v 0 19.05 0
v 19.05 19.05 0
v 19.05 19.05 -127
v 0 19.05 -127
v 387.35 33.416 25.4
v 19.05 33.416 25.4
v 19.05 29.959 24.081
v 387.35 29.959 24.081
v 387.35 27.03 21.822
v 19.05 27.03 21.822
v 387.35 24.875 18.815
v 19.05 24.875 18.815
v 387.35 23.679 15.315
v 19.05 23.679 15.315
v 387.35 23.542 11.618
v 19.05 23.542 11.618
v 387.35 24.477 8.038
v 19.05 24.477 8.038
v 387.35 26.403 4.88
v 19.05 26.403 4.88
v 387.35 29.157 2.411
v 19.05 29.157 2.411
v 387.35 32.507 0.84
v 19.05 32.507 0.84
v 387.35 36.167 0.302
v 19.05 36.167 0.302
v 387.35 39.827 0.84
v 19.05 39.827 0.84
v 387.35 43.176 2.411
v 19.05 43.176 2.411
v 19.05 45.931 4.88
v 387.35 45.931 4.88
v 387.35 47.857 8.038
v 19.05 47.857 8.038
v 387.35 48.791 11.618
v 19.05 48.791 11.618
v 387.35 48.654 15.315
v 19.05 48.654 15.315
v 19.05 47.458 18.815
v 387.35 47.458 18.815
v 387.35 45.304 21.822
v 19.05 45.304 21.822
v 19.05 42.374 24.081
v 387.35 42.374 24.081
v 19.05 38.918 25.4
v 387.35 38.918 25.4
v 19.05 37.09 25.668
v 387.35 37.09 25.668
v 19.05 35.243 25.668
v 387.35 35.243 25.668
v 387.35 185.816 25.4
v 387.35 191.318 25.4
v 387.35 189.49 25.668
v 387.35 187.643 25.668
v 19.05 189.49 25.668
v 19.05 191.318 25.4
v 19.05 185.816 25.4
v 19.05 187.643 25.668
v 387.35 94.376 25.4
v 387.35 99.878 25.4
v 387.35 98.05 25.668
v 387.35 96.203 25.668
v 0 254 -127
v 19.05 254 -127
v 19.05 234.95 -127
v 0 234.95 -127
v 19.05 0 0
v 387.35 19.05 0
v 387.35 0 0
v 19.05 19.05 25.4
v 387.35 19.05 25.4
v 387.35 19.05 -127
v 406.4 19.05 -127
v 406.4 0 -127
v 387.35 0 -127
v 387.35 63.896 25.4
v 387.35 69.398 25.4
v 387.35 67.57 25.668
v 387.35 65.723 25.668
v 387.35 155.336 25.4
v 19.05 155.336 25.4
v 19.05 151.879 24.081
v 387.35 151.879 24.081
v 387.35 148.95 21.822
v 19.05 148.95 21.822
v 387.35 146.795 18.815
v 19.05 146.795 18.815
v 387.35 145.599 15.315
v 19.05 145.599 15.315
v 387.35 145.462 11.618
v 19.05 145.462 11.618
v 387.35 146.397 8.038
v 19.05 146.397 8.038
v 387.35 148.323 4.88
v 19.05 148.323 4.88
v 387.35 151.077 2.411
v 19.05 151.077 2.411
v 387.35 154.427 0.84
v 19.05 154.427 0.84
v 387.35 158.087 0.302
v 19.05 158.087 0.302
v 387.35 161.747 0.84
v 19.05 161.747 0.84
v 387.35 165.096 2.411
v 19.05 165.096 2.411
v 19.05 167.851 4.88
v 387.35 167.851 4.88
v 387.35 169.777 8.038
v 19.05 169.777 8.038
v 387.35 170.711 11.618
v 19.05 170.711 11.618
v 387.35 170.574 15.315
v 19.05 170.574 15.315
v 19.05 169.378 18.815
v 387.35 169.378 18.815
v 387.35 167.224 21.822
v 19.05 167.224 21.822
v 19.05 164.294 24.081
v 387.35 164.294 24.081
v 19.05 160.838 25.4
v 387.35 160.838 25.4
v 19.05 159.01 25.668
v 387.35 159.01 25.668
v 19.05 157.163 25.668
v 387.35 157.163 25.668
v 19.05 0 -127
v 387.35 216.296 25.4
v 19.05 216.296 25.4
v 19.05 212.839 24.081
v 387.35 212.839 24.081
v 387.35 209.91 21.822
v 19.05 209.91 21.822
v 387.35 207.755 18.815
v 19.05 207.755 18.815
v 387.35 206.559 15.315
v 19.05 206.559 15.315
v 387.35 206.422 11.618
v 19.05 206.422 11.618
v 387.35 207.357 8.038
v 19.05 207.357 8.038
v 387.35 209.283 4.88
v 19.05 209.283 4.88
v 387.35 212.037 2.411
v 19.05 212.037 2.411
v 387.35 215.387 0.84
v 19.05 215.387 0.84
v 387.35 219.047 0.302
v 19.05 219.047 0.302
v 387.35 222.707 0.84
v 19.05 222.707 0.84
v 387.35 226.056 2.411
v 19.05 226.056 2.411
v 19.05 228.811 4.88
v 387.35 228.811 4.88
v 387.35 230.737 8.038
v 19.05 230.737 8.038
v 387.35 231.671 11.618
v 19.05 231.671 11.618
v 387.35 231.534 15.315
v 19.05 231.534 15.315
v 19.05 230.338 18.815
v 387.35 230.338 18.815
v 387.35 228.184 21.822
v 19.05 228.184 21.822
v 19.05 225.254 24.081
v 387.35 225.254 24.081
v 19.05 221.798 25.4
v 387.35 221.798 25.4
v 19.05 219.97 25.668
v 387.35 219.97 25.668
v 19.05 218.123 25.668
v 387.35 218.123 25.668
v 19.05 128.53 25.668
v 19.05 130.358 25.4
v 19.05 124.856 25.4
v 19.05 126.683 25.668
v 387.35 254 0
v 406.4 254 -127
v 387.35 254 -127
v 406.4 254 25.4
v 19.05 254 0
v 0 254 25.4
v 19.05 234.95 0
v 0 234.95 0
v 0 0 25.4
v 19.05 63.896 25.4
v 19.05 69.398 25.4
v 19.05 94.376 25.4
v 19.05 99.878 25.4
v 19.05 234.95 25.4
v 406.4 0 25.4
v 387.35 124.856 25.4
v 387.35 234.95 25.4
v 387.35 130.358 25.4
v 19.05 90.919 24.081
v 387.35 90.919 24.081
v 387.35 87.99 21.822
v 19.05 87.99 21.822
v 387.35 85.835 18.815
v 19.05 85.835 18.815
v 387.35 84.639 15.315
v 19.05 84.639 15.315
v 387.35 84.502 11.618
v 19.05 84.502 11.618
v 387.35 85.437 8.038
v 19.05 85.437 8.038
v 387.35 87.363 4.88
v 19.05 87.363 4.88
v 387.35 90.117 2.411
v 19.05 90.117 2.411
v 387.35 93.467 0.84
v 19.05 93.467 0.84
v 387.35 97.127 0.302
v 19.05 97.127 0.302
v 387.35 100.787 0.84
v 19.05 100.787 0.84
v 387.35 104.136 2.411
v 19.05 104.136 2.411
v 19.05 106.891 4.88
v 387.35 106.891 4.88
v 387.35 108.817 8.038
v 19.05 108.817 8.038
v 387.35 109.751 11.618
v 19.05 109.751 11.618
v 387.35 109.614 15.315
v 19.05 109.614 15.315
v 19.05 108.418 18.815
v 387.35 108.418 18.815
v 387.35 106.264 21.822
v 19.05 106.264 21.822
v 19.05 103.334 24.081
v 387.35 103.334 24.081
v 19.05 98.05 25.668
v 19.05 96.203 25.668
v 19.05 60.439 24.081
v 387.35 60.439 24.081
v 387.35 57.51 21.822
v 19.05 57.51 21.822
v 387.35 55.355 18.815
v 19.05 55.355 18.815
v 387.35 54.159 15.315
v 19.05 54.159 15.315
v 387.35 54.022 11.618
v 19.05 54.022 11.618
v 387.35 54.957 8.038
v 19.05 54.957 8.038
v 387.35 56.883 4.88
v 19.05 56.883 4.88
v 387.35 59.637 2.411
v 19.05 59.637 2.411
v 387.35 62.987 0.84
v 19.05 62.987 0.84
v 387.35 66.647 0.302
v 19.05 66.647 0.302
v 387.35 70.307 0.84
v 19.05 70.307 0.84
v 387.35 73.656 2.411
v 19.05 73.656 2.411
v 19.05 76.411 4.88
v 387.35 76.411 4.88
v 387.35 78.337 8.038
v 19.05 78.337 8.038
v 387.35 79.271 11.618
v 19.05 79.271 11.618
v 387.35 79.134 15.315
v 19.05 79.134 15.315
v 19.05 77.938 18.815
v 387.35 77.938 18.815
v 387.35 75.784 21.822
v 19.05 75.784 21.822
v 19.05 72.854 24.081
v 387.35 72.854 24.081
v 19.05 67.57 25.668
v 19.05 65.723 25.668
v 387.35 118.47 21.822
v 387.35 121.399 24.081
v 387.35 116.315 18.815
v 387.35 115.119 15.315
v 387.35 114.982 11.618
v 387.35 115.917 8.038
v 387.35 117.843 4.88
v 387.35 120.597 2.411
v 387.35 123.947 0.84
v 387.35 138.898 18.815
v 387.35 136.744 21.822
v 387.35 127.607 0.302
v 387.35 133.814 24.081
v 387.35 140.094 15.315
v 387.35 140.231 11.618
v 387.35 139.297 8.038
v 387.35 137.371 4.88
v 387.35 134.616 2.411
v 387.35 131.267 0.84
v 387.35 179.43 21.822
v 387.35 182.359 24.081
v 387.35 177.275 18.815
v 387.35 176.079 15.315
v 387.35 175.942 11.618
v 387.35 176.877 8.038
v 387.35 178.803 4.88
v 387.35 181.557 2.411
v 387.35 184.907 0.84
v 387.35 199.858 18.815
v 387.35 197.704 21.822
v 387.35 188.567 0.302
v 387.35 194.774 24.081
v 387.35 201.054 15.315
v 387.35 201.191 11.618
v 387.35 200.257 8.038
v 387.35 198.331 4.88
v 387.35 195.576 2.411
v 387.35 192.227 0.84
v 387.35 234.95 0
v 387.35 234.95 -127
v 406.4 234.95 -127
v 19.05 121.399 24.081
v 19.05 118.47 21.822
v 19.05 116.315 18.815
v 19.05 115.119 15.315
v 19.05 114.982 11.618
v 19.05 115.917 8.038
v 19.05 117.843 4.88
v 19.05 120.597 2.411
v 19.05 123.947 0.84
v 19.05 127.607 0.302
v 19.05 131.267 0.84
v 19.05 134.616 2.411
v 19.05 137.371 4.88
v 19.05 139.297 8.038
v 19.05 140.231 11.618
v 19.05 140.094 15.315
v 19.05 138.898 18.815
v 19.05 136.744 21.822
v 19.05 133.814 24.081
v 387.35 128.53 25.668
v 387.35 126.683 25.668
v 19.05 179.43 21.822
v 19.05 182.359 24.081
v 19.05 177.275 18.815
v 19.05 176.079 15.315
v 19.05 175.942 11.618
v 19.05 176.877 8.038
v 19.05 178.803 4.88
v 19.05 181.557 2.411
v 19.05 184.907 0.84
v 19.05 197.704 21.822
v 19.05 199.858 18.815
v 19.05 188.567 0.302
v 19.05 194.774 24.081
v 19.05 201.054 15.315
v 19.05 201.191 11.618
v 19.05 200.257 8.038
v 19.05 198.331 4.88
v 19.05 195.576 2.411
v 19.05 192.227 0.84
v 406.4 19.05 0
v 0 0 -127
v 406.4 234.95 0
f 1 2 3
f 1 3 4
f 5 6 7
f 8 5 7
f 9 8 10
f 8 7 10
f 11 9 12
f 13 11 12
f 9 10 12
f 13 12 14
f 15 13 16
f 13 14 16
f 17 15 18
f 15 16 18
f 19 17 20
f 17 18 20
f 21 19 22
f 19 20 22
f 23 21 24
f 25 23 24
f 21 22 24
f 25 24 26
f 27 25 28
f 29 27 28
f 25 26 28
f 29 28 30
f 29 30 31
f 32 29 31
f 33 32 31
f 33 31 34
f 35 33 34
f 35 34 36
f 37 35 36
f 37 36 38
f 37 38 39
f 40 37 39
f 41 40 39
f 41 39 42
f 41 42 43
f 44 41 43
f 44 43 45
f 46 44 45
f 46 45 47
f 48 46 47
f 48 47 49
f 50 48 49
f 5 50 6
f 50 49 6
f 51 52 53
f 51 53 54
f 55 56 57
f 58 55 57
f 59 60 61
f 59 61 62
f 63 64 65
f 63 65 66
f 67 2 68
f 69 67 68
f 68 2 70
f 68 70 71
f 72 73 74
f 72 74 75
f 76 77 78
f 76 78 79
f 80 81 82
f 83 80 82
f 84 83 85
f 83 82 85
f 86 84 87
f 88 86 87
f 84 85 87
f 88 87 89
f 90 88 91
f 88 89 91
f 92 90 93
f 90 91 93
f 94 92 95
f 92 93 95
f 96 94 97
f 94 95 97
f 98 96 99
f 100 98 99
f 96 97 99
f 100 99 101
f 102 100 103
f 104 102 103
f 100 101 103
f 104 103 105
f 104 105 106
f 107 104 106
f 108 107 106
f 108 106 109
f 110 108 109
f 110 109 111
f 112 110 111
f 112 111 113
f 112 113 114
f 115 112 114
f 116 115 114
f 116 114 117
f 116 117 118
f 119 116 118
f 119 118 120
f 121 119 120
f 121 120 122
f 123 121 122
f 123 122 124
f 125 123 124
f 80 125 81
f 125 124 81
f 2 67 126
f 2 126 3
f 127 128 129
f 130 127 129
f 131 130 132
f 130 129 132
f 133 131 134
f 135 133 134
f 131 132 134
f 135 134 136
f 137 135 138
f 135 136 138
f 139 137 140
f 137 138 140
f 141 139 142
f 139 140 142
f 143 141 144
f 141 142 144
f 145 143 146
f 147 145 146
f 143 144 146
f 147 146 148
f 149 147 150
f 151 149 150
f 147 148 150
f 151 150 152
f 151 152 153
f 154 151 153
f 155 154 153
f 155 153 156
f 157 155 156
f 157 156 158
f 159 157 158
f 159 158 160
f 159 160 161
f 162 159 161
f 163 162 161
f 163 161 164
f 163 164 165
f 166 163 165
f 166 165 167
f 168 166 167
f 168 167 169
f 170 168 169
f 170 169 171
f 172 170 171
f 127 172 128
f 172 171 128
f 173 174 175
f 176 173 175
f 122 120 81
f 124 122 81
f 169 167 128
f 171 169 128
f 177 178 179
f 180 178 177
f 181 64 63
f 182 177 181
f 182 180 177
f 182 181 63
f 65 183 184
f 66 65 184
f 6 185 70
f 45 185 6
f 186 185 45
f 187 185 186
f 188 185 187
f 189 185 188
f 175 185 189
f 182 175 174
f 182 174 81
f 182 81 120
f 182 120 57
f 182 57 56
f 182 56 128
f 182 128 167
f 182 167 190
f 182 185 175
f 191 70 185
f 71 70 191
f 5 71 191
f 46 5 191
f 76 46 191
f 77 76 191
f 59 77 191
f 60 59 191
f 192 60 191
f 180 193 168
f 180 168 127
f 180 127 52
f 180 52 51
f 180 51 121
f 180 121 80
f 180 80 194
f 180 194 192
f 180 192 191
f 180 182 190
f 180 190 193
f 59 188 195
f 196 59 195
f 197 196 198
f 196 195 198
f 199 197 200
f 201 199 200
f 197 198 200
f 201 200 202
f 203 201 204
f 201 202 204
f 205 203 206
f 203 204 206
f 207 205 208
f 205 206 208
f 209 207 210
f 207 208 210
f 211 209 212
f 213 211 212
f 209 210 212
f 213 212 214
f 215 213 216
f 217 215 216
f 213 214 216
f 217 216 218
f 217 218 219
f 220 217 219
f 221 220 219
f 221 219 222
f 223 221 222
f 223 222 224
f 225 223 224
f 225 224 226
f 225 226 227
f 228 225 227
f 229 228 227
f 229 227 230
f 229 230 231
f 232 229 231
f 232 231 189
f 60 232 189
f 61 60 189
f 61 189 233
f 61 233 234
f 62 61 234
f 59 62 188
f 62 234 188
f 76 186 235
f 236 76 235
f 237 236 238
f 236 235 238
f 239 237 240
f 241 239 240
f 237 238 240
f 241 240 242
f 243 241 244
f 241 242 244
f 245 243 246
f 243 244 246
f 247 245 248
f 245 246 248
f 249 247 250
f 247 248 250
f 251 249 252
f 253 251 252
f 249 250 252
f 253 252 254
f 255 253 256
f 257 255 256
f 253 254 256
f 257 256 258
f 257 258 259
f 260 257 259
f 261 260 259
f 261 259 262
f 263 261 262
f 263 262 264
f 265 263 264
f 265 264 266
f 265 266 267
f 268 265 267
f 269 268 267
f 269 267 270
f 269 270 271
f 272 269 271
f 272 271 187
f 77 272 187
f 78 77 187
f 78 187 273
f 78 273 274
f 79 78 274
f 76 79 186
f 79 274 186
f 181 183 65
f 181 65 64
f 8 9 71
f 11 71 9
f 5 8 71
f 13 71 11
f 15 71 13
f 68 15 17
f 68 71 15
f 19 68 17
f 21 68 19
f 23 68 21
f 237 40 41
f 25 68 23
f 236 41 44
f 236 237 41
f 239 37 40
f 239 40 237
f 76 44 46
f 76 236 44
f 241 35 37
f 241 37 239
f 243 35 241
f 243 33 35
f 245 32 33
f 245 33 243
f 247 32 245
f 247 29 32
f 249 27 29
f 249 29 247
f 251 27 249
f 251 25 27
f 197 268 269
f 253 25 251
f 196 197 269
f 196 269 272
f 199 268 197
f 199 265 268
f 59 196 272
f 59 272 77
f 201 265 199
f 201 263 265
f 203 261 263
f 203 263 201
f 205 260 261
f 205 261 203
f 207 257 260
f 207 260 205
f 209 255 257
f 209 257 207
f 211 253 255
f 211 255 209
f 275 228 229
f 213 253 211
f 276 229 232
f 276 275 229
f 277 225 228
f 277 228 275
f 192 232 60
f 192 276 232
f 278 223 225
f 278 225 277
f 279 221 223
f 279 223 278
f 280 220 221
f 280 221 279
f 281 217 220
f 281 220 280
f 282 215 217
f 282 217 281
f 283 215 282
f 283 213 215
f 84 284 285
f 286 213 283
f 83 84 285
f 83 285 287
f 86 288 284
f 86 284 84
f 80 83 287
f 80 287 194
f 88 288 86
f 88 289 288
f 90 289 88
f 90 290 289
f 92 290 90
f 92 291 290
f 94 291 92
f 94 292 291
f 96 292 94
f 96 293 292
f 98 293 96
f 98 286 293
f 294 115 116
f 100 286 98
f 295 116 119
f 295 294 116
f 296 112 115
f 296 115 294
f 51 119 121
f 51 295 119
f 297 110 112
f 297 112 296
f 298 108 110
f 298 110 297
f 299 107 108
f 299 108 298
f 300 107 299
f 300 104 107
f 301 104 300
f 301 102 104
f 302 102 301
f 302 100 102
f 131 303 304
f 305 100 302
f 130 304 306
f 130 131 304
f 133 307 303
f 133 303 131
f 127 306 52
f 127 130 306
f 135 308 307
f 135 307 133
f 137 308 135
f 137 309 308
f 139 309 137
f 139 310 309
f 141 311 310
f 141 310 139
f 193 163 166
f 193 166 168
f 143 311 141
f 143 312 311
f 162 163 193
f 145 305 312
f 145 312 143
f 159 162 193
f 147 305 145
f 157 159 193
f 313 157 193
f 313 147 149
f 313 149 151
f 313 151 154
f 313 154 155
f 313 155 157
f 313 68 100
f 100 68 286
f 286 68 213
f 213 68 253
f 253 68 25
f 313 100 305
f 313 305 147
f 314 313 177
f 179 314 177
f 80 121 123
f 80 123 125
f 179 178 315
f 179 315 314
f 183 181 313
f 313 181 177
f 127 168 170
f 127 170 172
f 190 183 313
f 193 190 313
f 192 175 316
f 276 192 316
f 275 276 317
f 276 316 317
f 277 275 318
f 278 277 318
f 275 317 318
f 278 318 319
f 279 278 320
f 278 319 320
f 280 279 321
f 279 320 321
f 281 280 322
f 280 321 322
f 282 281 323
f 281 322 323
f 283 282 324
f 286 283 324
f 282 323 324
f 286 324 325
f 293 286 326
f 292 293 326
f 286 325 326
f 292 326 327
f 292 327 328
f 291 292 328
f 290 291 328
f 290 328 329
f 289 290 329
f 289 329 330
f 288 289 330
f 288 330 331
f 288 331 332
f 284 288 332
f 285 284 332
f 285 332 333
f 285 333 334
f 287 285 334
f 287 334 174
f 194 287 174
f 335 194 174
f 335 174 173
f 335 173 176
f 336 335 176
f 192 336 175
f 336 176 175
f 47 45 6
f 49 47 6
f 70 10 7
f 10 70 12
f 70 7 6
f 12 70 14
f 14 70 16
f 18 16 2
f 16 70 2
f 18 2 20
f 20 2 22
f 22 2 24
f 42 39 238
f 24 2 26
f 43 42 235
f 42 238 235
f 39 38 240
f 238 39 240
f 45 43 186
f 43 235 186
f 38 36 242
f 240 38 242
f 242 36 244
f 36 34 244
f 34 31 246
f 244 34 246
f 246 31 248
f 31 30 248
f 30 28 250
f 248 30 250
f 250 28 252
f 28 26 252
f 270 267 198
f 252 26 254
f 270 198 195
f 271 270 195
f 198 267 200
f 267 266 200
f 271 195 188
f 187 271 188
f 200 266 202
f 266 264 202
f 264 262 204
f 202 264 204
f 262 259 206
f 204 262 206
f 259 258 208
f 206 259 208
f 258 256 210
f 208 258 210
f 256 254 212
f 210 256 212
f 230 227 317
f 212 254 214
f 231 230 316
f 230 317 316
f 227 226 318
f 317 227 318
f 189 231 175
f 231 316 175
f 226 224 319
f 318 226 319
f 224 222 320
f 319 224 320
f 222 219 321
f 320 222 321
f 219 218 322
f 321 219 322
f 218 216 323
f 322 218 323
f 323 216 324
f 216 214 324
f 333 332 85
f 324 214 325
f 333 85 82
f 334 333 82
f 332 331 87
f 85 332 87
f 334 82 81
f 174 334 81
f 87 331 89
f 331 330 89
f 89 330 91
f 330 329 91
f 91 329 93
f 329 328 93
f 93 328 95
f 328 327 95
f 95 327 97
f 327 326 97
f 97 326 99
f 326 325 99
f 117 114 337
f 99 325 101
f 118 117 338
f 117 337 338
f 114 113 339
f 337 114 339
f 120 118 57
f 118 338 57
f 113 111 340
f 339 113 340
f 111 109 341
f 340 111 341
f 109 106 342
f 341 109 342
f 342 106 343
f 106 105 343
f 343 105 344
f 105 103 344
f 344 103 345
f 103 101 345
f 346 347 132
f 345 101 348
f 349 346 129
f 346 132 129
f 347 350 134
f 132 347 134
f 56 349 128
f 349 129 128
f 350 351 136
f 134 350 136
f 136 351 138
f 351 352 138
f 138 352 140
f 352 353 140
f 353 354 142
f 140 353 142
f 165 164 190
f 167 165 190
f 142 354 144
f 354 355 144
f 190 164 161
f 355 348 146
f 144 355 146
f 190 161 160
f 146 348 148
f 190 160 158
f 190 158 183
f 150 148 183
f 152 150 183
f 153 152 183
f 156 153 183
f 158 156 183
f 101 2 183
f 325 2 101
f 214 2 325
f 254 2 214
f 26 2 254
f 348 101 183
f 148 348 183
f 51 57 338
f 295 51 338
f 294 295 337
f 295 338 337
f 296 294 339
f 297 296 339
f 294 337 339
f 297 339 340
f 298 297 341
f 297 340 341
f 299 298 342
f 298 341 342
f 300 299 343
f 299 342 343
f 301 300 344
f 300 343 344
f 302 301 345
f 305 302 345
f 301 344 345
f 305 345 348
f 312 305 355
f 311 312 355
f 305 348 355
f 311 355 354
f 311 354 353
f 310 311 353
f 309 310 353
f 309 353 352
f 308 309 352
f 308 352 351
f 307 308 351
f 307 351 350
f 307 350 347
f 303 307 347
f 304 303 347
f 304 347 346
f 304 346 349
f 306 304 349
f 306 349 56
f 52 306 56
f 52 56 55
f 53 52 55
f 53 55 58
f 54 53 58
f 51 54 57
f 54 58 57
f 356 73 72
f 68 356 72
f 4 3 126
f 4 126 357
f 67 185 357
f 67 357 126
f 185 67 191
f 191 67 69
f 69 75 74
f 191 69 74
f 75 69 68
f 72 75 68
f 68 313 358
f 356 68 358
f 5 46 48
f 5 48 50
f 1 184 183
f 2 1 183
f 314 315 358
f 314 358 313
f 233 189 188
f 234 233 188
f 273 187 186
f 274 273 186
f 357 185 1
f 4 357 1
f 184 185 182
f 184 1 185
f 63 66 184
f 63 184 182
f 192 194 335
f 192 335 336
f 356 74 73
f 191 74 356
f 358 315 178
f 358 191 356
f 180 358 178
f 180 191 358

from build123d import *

# Parameters (mm, degrees)
SKETCH1_W           = 406.4
SKETCH1_H           = 254
SKETCH1_W_2         = 368.3
SKETCH1_H_2         = 215.9
BOSS_EXTRUDE1_DEPTH = 25.4
SKETCH2_R           = 12.7
BOSS_EXTRUDE2_DEPTH = 368.3
SKETCH3_W           = 19.05
SKETCH3_H           = 19.05
BOSS_EXTRUDE3_DEPTH = 127


with BuildPart() as part:
    # Sketch1 → Boss-Extrude1 (new body)
    with BuildSketch(Plane.XY):
        with Locations((203.2, 127)):
            Rectangle(SKETCH1_W, SKETCH1_H)
        with Locations((203.2, 127)):
            Rectangle(SKETCH1_W_2, SKETCH1_H_2, mode=Mode.SUBTRACT)
    extrude(amount=BOSS_EXTRUDE1_DEPTH)

    # Sketch2 → Boss-Extrude2 (add)
    with BuildSketch(Plane(origin=(19.05, 0, 0), x_dir=(0, 0, -1), z_dir=(1, 0, 0))):
        with Locations(Location((-13.001554518, 219.046700044, 0), (0, 0, 192.51070534))):
            Circle(SKETCH2_R)
        with Locations(Location((-13.001554518, 188.566700044, 0), (0, 0, 192.51070534))):
            Circle(SKETCH2_R)
        with Locations(Location((-13.001554518, 158.086700044, 0), (0, 0, 192.51070534))):
            Circle(SKETCH2_R)
        with Locations(Location((-13.001554518, 127.606700044, 0), (0, 0, 192.51070534))):
            Circle(SKETCH2_R)
        with Locations(Location((-13.001554518, 97.126700044, 0), (0, 0, 192.51070534))):
            Circle(SKETCH2_R)
        with Locations(Location((-13.001554518, 66.646700044, 0), (0, 0, 192.51070534))):
            Circle(SKETCH2_R)
        with Locations(Location((-13.001554518, 36.166700044, 0), (0, 0, 192.51070534))):
            Circle(SKETCH2_R)
    extrude(amount=BOSS_EXTRUDE2_DEPTH)

    # Sketch3 → Boss-Extrude3 (add)
    with BuildSketch(Plane(origin=(0, 0, 0), x_dir=(-1, 0, 0), z_dir=(0, 0, -1))):
        with Locations((-396.875, 244.475)):
            Rectangle(SKETCH3_W, SKETCH3_H)
        with Locations((-396.875, 9.525)):
            Rectangle(SKETCH3_W, SKETCH3_H)
        with Locations((-9.525, 244.475)):
            Rectangle(SKETCH3_W, SKETCH3_H)
        with Locations((-9.525, 9.525)):
            Rectangle(SKETCH3_W, SKETCH3_H)
    extrude(amount=BOSS_EXTRUDE3_DEPTH)


solid = part.part
